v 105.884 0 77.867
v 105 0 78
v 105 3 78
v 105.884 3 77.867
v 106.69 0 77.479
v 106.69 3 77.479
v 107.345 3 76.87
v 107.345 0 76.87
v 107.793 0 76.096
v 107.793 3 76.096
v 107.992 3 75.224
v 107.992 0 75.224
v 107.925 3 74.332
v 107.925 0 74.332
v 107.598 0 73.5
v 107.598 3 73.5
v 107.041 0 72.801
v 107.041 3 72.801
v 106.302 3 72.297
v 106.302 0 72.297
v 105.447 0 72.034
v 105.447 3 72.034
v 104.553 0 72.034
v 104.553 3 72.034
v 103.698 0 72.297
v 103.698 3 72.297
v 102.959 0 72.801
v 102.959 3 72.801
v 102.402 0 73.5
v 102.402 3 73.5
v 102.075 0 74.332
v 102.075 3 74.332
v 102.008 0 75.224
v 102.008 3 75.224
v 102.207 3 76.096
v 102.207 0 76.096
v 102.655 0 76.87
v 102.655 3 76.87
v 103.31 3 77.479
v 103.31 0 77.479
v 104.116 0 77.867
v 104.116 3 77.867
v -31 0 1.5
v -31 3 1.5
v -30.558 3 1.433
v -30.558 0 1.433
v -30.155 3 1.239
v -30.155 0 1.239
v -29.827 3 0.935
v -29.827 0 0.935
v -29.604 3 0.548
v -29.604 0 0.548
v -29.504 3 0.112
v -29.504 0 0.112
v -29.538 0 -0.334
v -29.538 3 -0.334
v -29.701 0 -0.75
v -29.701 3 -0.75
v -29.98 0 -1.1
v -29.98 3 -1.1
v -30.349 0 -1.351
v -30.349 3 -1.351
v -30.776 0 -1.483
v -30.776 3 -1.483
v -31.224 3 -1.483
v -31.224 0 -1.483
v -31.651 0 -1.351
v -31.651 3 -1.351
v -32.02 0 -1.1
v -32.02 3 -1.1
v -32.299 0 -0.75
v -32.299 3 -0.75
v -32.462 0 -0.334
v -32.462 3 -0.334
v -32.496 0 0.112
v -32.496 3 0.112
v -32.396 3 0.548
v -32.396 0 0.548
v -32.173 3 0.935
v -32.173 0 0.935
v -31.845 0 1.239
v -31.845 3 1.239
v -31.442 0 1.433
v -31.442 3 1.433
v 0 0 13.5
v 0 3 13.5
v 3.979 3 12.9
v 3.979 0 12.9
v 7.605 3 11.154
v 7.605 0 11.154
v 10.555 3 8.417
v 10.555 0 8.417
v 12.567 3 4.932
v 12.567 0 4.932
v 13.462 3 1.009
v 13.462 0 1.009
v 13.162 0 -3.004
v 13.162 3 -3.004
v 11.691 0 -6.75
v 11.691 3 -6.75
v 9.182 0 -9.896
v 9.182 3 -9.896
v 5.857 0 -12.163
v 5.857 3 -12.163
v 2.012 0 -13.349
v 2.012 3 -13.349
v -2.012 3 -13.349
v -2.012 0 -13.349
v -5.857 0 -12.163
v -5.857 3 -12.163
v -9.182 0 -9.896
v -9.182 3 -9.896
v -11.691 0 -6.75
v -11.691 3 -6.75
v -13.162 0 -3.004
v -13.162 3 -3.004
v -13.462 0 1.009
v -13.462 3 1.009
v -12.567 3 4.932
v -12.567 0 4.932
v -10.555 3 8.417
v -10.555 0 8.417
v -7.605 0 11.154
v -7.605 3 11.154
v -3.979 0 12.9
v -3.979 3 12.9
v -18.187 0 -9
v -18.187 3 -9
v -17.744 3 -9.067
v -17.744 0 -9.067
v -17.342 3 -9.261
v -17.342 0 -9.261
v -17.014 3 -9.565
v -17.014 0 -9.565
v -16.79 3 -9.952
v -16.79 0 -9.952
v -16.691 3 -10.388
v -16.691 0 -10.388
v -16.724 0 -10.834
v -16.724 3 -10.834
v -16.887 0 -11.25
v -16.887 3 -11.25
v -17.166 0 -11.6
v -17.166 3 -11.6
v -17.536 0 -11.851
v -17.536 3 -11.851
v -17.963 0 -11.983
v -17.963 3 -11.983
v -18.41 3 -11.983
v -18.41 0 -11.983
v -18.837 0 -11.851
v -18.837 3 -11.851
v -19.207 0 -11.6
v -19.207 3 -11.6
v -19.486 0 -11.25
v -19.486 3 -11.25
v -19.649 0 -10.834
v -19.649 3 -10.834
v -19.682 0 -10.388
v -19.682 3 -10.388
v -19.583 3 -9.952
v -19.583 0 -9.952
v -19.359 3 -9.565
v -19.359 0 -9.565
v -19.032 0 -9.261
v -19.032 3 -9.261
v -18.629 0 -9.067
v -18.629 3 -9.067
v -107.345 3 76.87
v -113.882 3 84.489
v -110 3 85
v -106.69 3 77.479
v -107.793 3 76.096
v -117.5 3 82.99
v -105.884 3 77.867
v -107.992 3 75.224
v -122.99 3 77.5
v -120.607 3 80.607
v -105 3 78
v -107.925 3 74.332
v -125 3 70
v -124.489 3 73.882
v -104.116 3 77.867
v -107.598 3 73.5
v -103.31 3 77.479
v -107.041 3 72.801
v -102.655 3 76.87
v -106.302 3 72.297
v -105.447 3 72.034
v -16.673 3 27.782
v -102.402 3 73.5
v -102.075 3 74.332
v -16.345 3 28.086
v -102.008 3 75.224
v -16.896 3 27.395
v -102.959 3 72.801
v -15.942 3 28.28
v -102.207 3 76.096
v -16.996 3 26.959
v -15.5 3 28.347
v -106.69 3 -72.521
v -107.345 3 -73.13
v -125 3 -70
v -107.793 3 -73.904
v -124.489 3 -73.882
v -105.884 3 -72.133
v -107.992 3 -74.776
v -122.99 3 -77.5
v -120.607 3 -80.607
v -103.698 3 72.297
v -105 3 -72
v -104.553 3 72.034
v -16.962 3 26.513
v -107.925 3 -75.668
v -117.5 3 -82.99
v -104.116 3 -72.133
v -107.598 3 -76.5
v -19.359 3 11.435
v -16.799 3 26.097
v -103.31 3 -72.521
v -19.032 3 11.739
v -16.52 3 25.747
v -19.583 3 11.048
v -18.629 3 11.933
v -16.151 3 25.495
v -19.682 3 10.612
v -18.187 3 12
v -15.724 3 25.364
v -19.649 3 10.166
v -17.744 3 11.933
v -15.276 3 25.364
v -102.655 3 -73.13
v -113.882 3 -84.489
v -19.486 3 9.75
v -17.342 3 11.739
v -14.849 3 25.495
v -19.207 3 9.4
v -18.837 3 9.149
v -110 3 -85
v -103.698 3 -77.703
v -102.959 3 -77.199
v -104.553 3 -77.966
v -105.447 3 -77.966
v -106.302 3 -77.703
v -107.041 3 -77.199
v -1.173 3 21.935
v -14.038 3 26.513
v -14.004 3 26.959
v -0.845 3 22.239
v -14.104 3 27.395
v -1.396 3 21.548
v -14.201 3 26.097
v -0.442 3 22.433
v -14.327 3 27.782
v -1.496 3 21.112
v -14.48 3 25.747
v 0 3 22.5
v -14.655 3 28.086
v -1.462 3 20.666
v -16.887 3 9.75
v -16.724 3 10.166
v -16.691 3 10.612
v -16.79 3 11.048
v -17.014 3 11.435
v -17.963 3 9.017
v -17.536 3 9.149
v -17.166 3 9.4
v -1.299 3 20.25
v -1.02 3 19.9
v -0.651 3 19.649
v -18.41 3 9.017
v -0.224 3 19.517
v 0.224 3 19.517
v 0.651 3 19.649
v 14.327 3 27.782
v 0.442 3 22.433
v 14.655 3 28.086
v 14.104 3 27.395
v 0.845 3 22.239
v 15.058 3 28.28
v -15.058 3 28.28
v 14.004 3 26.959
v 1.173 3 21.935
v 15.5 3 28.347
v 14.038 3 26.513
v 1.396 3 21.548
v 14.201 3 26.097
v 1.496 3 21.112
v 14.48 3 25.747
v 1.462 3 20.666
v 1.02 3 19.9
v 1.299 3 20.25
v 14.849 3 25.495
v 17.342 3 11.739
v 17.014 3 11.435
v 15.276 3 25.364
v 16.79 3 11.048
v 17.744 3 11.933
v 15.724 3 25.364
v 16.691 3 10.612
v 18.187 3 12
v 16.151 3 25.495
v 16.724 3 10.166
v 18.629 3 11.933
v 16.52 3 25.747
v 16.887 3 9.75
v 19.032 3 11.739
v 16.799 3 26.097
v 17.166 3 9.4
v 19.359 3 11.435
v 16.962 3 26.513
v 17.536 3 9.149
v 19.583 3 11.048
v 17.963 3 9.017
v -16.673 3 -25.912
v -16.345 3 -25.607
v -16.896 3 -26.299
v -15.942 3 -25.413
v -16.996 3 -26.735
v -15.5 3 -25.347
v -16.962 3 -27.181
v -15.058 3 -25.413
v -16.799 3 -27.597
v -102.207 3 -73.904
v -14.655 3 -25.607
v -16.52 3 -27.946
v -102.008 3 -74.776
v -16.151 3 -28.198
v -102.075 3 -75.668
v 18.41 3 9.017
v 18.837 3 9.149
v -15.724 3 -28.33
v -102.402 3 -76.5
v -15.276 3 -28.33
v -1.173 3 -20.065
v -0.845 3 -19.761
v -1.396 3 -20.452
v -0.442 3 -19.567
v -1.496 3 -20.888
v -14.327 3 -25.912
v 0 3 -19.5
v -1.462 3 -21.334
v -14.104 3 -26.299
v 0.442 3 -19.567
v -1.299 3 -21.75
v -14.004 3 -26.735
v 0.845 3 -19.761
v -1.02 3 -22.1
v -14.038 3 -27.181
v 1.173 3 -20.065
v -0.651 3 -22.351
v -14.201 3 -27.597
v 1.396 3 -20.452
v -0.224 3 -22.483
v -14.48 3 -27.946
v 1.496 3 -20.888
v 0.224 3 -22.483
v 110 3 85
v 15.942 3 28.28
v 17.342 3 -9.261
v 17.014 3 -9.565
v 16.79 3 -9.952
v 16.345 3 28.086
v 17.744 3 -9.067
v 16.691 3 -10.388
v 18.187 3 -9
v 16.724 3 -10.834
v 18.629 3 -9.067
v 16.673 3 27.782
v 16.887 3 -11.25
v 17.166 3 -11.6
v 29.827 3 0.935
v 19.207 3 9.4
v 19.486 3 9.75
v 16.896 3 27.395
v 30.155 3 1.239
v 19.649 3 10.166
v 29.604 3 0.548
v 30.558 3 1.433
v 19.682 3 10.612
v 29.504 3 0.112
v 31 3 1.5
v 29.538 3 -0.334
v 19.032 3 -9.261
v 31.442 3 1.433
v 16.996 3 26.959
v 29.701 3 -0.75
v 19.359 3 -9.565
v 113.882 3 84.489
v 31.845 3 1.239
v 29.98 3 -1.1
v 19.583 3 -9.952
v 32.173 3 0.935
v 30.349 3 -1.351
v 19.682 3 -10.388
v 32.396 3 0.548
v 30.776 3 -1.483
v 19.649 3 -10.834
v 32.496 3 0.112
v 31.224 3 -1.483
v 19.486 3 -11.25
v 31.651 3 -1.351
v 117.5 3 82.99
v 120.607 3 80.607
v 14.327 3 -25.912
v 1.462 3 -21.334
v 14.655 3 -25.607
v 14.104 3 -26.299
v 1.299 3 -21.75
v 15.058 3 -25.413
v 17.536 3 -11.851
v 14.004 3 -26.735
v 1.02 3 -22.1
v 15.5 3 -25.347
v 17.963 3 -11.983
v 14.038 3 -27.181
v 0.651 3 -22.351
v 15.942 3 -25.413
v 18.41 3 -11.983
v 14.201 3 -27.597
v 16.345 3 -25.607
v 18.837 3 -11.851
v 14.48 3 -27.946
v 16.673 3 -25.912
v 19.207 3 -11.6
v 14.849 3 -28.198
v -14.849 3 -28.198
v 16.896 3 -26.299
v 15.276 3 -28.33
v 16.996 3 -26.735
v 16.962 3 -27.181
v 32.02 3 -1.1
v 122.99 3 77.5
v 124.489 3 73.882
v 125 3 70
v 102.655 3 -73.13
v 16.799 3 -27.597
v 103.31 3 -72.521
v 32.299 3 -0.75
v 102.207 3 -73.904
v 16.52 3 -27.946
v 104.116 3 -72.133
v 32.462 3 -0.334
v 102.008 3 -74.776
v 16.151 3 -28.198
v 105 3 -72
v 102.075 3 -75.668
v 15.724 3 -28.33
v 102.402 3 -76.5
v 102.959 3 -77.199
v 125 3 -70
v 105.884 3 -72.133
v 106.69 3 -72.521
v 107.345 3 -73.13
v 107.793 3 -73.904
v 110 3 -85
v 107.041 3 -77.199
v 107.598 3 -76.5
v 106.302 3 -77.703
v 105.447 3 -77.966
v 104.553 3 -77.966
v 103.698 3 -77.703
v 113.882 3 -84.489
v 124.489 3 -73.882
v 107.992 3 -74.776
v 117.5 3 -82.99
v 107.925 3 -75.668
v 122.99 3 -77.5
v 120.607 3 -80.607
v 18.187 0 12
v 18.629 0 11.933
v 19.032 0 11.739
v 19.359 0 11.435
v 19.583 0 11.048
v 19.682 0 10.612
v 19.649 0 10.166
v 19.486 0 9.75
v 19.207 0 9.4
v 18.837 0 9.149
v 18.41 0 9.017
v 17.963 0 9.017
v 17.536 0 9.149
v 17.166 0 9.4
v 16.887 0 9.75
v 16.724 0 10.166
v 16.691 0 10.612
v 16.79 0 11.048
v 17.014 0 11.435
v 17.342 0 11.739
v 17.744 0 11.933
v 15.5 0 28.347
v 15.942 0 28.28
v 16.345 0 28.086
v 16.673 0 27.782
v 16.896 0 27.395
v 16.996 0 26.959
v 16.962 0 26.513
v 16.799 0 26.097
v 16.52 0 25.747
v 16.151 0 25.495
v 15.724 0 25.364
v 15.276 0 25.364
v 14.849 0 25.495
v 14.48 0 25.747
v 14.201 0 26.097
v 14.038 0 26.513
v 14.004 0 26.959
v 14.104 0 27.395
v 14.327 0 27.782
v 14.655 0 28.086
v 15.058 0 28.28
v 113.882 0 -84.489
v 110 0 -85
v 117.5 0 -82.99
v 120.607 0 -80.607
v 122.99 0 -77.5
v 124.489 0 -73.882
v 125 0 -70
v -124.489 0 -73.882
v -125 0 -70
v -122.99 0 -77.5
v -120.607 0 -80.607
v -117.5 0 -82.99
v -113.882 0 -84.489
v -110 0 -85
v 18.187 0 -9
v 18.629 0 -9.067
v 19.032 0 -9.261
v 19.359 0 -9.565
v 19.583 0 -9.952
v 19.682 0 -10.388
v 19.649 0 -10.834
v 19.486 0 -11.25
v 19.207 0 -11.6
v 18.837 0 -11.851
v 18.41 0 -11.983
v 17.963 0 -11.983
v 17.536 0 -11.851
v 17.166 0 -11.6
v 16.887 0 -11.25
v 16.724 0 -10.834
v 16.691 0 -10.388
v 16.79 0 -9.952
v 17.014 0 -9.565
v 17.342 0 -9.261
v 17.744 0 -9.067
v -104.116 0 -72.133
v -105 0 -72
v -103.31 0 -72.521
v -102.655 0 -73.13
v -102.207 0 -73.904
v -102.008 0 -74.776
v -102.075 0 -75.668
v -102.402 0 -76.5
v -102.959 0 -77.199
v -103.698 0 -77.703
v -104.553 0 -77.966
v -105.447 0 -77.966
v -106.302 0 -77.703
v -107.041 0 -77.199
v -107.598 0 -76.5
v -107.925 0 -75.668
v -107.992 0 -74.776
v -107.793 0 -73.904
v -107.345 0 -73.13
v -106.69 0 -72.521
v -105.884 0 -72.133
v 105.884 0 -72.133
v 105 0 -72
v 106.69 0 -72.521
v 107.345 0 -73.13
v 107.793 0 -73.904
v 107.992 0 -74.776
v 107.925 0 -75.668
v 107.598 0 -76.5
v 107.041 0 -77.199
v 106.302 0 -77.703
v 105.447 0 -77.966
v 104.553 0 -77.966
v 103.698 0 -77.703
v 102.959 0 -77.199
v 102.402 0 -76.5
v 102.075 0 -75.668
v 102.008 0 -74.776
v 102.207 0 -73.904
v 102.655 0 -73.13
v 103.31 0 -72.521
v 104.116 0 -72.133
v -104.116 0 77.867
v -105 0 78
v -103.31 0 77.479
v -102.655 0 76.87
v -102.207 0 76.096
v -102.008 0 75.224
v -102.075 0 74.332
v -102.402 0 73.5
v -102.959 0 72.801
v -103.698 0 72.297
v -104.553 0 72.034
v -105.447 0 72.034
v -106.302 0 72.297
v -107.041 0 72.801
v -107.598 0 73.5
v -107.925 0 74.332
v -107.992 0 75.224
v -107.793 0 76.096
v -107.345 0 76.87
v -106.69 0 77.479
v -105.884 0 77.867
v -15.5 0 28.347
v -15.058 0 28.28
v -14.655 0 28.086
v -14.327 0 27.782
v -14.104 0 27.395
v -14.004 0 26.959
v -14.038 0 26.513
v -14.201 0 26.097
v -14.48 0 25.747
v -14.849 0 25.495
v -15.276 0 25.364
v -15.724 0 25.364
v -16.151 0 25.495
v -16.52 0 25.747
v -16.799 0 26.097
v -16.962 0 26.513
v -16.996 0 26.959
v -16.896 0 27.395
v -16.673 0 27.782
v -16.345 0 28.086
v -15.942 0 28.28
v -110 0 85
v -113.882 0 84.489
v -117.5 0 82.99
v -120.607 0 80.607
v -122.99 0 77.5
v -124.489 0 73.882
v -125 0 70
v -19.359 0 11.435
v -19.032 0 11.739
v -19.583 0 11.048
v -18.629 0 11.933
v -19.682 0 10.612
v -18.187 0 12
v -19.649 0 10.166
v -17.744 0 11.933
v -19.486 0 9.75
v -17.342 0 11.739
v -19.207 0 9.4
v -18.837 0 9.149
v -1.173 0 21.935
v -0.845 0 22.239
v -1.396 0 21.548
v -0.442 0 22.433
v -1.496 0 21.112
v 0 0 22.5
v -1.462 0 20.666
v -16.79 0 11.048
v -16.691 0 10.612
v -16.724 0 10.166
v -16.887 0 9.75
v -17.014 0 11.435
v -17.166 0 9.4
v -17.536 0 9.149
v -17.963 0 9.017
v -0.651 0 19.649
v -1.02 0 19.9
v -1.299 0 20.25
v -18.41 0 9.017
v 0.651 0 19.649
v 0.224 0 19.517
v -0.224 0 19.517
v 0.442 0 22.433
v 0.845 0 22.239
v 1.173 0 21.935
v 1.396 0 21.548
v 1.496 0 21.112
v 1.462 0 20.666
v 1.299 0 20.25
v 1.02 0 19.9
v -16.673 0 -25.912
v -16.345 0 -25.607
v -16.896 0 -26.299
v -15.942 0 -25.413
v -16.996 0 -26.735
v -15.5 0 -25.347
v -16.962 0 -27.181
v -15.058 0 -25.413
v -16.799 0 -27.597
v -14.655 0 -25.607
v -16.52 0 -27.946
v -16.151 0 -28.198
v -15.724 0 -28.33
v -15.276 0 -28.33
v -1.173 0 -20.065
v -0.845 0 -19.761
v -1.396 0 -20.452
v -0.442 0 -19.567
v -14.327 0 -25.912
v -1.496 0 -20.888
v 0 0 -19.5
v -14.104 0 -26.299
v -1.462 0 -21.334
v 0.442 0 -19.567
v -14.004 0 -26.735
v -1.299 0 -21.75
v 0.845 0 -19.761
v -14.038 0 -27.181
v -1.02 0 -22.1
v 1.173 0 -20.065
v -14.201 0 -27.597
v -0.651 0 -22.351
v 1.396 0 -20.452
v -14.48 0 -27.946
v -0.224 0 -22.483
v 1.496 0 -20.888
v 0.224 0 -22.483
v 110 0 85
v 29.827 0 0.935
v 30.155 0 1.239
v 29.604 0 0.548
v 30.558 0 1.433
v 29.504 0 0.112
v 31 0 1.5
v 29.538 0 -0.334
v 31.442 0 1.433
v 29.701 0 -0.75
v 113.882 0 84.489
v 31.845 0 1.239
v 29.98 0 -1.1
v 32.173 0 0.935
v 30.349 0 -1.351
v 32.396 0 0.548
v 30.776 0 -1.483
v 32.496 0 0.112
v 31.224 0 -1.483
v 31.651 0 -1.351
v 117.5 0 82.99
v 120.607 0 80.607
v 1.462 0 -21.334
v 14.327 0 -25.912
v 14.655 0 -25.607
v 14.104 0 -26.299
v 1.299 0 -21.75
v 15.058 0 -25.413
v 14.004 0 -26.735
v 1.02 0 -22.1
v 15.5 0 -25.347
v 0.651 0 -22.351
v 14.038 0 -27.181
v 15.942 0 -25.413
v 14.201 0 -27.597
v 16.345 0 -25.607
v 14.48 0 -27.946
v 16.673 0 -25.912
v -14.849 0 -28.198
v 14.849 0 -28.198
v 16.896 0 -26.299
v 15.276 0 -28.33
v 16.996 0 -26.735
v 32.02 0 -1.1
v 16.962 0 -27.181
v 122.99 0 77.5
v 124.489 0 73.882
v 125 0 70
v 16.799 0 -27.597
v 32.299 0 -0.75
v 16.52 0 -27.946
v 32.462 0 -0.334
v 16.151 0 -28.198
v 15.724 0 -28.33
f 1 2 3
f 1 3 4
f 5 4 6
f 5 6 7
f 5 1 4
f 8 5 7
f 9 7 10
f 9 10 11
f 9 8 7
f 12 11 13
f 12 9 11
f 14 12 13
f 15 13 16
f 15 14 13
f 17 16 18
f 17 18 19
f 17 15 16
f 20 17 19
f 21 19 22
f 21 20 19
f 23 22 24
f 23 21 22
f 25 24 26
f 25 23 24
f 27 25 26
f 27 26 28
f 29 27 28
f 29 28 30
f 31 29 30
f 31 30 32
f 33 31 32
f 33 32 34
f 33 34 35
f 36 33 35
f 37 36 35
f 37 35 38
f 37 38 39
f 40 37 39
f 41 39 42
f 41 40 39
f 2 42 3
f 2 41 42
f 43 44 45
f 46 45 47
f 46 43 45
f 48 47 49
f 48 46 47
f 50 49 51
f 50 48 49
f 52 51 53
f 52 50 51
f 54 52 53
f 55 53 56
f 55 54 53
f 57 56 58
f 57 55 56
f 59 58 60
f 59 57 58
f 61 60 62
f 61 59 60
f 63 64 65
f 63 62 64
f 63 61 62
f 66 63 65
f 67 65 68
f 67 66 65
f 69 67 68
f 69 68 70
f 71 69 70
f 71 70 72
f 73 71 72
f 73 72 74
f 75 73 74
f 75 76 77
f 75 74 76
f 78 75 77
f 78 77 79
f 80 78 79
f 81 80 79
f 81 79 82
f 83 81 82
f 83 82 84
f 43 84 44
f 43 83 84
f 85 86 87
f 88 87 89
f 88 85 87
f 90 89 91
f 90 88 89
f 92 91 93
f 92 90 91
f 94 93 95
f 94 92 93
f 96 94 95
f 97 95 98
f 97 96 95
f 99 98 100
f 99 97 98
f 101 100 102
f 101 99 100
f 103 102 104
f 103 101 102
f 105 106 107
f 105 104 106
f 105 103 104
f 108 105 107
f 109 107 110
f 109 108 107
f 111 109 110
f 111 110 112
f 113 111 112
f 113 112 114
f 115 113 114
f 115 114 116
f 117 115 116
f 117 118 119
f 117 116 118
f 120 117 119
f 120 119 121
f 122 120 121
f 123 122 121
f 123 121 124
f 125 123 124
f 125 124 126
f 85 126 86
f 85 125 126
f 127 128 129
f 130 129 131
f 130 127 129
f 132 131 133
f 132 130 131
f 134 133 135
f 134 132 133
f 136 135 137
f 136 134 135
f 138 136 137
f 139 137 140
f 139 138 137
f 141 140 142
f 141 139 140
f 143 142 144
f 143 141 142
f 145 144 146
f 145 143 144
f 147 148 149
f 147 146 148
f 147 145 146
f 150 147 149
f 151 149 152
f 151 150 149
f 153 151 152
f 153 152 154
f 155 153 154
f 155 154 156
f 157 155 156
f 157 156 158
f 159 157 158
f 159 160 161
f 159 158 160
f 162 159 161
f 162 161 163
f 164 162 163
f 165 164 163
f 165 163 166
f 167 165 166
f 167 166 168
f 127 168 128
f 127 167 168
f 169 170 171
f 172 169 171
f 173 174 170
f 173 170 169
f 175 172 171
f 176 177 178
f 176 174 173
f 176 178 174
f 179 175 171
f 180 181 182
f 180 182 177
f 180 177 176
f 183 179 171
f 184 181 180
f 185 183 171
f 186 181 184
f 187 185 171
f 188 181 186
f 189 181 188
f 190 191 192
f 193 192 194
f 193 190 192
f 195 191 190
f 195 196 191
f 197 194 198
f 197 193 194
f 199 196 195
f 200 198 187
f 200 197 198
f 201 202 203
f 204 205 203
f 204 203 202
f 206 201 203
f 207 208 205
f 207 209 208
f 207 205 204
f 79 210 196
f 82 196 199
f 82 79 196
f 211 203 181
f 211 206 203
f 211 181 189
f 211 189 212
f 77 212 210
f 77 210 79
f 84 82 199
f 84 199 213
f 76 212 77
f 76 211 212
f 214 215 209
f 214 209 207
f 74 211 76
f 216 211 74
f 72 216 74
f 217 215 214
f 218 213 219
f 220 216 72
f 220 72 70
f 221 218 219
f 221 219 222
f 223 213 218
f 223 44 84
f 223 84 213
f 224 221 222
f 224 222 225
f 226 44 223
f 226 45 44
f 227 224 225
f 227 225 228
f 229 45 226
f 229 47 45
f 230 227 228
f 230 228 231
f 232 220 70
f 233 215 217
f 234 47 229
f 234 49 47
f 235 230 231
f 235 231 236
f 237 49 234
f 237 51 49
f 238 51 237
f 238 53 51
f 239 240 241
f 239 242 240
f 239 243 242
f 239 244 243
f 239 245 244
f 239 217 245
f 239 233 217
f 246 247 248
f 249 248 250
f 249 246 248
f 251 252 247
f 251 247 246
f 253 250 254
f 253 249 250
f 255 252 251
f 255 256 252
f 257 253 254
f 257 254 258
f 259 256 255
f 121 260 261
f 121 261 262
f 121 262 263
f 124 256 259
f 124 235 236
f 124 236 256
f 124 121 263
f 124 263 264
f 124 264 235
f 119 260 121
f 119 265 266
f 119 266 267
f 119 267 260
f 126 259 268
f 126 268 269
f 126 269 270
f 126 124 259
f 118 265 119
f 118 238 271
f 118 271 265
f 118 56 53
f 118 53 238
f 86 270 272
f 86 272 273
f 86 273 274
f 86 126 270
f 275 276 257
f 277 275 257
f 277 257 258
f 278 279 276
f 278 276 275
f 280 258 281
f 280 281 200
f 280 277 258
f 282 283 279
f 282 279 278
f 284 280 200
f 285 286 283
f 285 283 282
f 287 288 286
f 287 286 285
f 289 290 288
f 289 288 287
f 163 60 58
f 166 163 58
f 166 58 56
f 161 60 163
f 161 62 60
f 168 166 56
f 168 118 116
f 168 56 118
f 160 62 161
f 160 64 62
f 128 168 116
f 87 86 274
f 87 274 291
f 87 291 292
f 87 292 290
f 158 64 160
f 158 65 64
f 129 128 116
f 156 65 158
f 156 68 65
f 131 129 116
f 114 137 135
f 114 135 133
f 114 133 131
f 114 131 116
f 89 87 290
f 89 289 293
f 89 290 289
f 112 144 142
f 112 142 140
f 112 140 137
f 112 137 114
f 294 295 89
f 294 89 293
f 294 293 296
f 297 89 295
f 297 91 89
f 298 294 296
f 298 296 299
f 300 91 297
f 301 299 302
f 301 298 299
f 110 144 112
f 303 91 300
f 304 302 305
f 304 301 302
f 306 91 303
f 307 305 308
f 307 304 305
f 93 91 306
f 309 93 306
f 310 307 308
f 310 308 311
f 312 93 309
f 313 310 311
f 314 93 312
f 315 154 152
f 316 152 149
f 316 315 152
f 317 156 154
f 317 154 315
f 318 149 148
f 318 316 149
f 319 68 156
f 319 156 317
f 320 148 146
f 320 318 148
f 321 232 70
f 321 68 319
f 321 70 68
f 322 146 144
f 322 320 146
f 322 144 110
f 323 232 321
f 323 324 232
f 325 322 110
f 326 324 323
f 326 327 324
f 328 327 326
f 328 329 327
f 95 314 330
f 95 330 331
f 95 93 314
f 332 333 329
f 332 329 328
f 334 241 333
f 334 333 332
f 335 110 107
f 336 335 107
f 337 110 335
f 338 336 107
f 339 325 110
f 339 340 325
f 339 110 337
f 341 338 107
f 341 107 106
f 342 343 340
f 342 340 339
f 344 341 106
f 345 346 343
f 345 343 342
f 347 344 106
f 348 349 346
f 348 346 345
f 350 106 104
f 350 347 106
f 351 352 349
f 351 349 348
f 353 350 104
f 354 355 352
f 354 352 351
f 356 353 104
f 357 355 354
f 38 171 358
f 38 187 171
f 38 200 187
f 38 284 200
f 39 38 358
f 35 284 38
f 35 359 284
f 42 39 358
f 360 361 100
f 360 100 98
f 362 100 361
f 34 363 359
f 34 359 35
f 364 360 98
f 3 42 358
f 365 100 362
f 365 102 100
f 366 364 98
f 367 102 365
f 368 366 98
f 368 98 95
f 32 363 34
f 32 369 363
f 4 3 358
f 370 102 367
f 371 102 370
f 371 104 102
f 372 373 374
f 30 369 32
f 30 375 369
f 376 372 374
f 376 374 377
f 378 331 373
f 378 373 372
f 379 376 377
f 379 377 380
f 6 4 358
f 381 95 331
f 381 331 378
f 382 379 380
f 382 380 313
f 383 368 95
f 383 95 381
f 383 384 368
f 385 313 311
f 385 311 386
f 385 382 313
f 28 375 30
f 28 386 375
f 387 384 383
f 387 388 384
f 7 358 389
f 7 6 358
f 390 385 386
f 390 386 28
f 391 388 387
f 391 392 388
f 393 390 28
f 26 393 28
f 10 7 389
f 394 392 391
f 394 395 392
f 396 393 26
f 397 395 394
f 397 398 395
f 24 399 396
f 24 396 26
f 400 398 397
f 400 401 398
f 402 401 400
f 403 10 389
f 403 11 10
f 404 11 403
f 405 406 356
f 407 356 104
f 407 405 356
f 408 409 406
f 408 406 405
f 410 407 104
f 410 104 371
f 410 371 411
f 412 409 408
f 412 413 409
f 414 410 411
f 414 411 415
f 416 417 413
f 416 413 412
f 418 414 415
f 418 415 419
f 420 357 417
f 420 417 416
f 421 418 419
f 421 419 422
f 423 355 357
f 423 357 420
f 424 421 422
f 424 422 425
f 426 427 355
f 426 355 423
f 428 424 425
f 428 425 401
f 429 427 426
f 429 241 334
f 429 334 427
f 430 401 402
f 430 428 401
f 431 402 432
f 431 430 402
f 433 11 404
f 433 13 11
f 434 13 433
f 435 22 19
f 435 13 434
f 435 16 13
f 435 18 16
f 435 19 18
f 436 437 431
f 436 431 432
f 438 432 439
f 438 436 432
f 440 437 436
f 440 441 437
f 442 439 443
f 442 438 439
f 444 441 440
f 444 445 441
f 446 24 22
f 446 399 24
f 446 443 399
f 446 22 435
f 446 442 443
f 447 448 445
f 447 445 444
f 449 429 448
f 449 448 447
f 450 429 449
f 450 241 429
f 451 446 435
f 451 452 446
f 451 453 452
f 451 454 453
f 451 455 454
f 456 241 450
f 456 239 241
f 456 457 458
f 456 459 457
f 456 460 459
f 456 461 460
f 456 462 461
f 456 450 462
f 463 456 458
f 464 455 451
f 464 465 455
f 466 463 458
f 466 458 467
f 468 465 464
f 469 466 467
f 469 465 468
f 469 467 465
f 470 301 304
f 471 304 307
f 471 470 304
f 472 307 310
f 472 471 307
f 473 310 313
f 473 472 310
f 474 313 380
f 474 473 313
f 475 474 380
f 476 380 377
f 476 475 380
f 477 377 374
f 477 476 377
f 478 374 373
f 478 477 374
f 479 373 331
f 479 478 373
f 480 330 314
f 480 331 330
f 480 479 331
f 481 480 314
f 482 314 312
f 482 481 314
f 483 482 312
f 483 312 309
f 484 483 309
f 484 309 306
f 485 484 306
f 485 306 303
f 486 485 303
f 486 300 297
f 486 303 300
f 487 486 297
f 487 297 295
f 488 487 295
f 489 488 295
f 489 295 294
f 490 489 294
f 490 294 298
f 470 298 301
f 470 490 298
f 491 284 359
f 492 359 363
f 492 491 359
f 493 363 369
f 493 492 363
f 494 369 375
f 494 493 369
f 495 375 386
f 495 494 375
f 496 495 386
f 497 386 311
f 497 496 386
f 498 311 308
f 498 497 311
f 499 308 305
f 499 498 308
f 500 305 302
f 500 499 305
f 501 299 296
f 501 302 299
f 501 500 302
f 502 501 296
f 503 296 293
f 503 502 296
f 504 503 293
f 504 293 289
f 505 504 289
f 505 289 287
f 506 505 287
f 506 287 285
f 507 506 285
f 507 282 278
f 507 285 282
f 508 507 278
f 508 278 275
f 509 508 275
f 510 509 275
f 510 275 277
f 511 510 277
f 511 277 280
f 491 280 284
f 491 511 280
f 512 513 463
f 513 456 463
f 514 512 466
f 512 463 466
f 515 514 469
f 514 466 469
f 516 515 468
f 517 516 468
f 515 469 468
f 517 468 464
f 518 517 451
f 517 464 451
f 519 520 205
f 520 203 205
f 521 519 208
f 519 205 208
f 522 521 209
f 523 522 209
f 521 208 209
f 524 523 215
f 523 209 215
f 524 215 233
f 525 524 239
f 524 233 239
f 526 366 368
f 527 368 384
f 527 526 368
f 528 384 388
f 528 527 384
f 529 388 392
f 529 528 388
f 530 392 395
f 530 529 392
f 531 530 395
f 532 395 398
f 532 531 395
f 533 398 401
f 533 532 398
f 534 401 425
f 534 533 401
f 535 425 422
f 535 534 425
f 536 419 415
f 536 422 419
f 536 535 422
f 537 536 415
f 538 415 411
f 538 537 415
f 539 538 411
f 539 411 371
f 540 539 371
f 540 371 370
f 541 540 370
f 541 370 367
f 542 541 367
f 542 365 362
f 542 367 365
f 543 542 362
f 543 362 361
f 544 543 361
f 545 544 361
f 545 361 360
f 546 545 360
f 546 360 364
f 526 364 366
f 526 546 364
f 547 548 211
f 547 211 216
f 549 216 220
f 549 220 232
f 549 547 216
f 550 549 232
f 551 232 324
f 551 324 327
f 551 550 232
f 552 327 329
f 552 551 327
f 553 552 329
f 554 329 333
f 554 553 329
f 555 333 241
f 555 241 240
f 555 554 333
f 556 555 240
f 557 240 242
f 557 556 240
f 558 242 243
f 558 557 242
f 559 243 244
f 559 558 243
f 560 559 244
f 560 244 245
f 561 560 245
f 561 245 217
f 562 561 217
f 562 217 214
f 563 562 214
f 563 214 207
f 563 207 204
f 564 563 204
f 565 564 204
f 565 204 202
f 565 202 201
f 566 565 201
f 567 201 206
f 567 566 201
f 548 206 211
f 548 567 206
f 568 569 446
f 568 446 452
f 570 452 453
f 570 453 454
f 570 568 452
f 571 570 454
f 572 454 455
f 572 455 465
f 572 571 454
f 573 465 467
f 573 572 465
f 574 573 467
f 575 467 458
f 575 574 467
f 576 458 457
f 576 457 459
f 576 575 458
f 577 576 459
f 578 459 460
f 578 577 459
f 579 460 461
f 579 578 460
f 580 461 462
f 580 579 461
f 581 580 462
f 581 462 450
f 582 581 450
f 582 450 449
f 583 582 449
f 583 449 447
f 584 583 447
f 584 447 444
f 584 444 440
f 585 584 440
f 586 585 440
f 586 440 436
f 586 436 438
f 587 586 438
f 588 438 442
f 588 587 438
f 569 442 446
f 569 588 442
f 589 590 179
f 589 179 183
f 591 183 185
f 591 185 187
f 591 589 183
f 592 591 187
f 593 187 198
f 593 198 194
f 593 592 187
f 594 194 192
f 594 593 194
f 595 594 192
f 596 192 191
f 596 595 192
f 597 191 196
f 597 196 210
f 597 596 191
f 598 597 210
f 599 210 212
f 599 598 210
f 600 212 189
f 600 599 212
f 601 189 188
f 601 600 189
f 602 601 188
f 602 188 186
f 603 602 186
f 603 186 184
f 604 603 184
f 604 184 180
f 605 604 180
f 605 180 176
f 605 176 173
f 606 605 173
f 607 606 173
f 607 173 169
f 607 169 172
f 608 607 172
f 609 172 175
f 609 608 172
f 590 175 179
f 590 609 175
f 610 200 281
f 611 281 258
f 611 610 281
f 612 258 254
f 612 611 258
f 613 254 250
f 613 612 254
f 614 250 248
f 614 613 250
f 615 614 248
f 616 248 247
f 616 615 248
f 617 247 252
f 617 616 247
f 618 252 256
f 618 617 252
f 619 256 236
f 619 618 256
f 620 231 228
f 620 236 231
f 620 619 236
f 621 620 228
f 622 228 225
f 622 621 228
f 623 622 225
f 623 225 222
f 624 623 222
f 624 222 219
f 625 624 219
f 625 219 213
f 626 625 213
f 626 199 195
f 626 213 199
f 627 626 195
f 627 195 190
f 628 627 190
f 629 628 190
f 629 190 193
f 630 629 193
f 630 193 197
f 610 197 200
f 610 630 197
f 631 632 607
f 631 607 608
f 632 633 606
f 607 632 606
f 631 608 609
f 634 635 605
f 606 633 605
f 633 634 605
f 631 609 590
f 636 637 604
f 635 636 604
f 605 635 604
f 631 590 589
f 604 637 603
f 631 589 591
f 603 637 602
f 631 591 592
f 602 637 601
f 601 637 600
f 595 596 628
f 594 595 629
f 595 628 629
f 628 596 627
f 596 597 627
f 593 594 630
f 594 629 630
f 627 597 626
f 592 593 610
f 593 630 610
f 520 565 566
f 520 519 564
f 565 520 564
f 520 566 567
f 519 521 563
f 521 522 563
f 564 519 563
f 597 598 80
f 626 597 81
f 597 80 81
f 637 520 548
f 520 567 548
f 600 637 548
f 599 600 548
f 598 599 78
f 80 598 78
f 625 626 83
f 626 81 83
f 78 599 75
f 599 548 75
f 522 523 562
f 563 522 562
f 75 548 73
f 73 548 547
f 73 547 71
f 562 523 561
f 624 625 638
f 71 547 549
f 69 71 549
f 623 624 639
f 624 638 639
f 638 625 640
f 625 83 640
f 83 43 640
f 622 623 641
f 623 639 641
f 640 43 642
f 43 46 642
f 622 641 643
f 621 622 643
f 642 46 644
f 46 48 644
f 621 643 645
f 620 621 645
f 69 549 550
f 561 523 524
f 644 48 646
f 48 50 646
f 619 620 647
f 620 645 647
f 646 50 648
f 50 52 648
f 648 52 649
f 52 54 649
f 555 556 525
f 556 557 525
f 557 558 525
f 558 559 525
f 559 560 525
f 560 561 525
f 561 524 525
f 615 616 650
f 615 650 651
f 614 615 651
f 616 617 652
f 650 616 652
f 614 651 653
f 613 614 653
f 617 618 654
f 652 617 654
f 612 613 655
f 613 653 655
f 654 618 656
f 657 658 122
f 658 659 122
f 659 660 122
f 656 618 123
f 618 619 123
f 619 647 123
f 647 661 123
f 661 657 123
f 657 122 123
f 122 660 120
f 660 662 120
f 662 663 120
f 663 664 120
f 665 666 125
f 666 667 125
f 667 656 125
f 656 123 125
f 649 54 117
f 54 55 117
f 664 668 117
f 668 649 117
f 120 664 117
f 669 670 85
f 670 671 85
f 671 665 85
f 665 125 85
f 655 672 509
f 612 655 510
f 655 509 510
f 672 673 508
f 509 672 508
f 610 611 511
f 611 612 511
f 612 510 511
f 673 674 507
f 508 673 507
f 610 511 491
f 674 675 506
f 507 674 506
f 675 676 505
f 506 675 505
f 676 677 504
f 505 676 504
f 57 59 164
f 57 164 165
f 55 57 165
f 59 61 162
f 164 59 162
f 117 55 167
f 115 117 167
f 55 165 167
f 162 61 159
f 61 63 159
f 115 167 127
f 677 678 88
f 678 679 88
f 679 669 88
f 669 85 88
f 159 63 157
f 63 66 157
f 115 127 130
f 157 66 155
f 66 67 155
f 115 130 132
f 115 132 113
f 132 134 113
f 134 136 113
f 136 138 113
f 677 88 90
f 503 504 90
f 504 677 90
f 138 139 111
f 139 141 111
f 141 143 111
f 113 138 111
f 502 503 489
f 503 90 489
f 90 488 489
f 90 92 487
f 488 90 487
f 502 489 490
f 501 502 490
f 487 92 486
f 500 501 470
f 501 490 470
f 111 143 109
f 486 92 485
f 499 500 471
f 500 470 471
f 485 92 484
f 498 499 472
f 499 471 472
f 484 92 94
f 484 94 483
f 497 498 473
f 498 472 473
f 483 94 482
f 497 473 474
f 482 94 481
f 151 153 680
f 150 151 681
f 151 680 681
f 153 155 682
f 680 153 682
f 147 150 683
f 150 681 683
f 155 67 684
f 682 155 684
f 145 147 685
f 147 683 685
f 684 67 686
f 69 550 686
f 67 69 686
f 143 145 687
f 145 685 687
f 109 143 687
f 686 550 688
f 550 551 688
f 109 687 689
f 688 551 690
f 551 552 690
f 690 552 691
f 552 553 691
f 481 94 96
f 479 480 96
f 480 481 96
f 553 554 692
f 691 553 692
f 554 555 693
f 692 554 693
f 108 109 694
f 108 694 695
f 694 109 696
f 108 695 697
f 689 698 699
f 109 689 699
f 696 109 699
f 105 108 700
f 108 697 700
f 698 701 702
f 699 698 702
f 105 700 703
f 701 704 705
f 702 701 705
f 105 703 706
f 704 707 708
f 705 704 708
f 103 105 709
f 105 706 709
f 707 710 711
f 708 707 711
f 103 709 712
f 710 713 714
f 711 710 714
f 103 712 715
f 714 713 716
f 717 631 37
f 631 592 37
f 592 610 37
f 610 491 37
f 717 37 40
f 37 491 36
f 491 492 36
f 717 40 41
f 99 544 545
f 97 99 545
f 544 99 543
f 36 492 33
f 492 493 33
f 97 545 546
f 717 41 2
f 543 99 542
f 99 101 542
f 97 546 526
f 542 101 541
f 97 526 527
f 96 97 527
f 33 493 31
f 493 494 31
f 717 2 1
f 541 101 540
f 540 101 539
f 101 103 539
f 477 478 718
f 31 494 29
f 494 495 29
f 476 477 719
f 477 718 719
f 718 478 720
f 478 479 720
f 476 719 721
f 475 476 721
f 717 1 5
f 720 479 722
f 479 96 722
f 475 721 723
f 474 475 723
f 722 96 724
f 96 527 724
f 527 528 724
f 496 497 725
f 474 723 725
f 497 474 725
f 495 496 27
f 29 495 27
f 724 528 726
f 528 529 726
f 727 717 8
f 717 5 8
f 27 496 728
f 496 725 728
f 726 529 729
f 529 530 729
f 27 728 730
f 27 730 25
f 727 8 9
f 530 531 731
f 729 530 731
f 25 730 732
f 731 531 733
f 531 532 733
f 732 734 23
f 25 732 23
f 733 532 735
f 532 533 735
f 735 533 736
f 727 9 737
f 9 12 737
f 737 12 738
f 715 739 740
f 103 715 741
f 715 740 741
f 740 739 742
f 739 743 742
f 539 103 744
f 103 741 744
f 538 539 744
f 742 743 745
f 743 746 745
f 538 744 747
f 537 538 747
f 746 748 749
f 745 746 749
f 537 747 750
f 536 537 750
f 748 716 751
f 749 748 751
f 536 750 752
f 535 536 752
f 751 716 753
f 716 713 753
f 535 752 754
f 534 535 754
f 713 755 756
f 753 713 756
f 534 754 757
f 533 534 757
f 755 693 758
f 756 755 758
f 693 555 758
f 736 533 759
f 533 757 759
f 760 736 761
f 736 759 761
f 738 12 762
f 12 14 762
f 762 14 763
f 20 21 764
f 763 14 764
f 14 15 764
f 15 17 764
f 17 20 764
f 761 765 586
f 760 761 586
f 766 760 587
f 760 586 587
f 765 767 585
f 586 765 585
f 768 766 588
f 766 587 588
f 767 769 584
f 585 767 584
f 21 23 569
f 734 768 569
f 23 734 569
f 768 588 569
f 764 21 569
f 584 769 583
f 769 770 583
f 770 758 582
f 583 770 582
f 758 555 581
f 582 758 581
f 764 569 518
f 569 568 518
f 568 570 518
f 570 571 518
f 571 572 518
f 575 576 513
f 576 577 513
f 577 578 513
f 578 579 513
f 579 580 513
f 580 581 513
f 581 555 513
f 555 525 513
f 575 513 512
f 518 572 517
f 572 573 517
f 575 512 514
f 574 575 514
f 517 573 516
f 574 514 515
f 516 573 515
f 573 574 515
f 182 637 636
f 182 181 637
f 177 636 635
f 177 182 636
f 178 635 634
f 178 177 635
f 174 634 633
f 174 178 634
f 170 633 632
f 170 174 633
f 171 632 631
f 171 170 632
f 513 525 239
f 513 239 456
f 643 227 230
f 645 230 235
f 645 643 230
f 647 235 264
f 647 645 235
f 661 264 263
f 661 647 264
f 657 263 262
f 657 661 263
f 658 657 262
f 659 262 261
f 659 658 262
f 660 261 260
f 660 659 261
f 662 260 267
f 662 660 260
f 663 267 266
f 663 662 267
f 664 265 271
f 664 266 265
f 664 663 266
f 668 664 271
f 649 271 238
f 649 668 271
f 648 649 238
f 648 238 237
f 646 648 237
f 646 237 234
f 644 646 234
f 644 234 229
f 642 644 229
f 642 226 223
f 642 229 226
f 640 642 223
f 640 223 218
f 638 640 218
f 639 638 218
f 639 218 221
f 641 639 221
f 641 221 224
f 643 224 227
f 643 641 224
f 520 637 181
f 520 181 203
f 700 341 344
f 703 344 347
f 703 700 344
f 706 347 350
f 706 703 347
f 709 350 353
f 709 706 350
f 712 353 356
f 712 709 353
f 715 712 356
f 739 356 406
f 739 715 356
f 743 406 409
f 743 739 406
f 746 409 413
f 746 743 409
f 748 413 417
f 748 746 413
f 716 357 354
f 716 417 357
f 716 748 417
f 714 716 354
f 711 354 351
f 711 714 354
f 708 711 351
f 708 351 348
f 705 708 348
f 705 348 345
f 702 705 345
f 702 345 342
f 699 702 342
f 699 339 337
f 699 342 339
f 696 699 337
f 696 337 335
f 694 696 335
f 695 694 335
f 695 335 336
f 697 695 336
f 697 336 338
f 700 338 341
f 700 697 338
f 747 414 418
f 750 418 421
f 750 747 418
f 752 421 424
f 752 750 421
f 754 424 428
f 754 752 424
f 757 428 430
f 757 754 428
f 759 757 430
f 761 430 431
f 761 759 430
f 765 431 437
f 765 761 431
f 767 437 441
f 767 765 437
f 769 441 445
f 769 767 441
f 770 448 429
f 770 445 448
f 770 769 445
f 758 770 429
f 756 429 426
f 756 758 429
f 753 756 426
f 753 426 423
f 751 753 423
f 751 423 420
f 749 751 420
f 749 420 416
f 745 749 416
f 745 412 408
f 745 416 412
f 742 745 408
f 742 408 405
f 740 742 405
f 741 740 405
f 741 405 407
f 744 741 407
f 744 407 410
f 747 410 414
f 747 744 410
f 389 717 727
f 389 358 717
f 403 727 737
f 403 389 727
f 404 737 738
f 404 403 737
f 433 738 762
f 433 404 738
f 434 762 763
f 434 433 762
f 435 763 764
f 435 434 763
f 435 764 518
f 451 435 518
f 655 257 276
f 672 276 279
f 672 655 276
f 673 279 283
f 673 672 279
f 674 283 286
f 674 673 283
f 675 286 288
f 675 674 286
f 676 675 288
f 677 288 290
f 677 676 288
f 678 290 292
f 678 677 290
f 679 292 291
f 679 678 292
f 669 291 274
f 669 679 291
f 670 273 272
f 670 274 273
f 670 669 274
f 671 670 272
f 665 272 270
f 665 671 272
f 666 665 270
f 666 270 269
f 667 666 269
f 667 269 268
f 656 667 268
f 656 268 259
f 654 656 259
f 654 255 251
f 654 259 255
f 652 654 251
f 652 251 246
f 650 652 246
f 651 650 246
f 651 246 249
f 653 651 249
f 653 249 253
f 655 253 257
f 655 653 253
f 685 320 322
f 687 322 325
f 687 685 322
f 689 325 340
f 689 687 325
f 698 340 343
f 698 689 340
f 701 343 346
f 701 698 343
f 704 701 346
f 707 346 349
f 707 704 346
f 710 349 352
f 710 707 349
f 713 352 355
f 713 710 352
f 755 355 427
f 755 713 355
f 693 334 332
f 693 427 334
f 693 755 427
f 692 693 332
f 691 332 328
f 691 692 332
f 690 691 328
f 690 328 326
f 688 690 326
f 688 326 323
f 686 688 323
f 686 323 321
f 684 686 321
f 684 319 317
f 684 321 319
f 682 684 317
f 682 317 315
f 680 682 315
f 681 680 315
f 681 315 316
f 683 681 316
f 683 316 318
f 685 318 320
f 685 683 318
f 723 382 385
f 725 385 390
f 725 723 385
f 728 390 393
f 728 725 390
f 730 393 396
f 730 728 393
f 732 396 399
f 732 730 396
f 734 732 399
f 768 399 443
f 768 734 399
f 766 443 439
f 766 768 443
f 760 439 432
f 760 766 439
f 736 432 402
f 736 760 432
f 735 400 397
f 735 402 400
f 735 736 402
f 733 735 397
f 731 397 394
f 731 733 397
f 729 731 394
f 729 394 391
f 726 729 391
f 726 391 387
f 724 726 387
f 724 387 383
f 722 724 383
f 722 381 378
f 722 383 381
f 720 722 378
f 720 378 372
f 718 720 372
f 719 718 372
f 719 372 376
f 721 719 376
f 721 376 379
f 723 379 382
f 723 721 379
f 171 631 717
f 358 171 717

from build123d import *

# Parameters (mm, degrees)
SKETCH_1_W          = 250
SKETCH_1_H          = 170
SKETCH_1_R          = 3
EXTRUDE_1_DEPTH     = 3
FILLET_1_R          = 15
SKETCH_2_R          = 1.5
SKETCH_2_R_2        = 13.5
CUT_EXTRUDE_1_DEPTH = 152.191931002


with BuildPart() as part:
    # 草图1 → 凸台-拉伸1 (new body)
    with BuildSketch(Plane(origin=(0, 0, 0), x_dir=(1, 0, 0), z_dir=(0, 1, 0))):
        Rectangle(SKETCH_1_W, SKETCH_1_H)
        with Locations(Location((-105, 75, 0), (0, 0, 270))):
            Circle(SKETCH_1_R, mode=Mode.SUBTRACT)
        with Locations(Location((105, 75, 0), (0, 0, 270))):
            Circle(SKETCH_1_R, mode=Mode.SUBTRACT)
        with Locations(Location((-105, -75, 0), (0, 0, 270))):
            Circle(SKETCH_1_R, mode=Mode.SUBTRACT)
        with Locations(Location((105, -75, 0), (0, 0, 270))):
            Circle(SKETCH_1_R, mode=Mode.SUBTRACT)
    extrude(amount=EXTRUDE_1_DEPTH)

    # 圆角1
    fillet_1_edges = [part.edges().sort_by_distance(p)[0] for p in [
        (125, 1.5, 85),
        (-125, 1.5, 85),
        (-125, 1.5, -85),
        (125, 1.5, -85),
    ]]
    fillet(fillet_1_edges, radius=FILLET_1_R)

    # 草图2 → 切除-拉伸1 (cut, through all)
    with BuildSketch(Plane(origin=(0, 0, 0), x_dir=(1, 0, 0), z_dir=(0, 1, 0))):
        with Locations(Location((0, 21, 0), (0, 0, 270))):
            Circle(SKETCH_2_R)
        with Locations(Location((18.186533479, 10.5, 0), (0, 0, 270))):
            Circle(SKETCH_2_R)
        with Locations(Location((18.186533479, -10.5, 0), (0, 0, 270))):
            Circle(SKETCH_2_R)
        with Locations(Location((0, -21, 0), (0, 0, 270))):
            Circle(SKETCH_2_R)
        with Locations(Location((-18.186533479, -10.5, 0), (0, 0, 270))):
            Circle(SKETCH_2_R)
        with Locations(Location((-18.186533479, 10.5, 0), (0, 0, 270))):
            Circle(SKETCH_2_R)
        with Locations(Location((31, 0, 0), (0, 0, 270))):
            Circle(SKETCH_2_R)
        with Locations(Location((15.5, -26.846787517, 0), (0, 0, 270))):
            Circle(SKETCH_2_R)
        with Locations(Location((-15.5, -26.846787517, 0), (0, 0, 270))):
            Circle(SKETCH_2_R)
        with Locations(Location((-31, 0, 0), (0, 0, 270))):
            Circle(SKETCH_2_R)
        with Locations(Location((-15.5, 26.846787517, 0), (0, 0, 270))):
            Circle(SKETCH_2_R)
        with Locations(Location((15.5, 26.846787517, 0), (0, 0, 270))):
            Circle(SKETCH_2_R)
        with Locations(Location((0, 0, 0), (0, 0, 270))):
            Circle(SKETCH_2_R_2)
    extrude(amount=CUT_EXTRUDE_1_DEPTH, mode=Mode.SUBTRACT)


solid = part.part
